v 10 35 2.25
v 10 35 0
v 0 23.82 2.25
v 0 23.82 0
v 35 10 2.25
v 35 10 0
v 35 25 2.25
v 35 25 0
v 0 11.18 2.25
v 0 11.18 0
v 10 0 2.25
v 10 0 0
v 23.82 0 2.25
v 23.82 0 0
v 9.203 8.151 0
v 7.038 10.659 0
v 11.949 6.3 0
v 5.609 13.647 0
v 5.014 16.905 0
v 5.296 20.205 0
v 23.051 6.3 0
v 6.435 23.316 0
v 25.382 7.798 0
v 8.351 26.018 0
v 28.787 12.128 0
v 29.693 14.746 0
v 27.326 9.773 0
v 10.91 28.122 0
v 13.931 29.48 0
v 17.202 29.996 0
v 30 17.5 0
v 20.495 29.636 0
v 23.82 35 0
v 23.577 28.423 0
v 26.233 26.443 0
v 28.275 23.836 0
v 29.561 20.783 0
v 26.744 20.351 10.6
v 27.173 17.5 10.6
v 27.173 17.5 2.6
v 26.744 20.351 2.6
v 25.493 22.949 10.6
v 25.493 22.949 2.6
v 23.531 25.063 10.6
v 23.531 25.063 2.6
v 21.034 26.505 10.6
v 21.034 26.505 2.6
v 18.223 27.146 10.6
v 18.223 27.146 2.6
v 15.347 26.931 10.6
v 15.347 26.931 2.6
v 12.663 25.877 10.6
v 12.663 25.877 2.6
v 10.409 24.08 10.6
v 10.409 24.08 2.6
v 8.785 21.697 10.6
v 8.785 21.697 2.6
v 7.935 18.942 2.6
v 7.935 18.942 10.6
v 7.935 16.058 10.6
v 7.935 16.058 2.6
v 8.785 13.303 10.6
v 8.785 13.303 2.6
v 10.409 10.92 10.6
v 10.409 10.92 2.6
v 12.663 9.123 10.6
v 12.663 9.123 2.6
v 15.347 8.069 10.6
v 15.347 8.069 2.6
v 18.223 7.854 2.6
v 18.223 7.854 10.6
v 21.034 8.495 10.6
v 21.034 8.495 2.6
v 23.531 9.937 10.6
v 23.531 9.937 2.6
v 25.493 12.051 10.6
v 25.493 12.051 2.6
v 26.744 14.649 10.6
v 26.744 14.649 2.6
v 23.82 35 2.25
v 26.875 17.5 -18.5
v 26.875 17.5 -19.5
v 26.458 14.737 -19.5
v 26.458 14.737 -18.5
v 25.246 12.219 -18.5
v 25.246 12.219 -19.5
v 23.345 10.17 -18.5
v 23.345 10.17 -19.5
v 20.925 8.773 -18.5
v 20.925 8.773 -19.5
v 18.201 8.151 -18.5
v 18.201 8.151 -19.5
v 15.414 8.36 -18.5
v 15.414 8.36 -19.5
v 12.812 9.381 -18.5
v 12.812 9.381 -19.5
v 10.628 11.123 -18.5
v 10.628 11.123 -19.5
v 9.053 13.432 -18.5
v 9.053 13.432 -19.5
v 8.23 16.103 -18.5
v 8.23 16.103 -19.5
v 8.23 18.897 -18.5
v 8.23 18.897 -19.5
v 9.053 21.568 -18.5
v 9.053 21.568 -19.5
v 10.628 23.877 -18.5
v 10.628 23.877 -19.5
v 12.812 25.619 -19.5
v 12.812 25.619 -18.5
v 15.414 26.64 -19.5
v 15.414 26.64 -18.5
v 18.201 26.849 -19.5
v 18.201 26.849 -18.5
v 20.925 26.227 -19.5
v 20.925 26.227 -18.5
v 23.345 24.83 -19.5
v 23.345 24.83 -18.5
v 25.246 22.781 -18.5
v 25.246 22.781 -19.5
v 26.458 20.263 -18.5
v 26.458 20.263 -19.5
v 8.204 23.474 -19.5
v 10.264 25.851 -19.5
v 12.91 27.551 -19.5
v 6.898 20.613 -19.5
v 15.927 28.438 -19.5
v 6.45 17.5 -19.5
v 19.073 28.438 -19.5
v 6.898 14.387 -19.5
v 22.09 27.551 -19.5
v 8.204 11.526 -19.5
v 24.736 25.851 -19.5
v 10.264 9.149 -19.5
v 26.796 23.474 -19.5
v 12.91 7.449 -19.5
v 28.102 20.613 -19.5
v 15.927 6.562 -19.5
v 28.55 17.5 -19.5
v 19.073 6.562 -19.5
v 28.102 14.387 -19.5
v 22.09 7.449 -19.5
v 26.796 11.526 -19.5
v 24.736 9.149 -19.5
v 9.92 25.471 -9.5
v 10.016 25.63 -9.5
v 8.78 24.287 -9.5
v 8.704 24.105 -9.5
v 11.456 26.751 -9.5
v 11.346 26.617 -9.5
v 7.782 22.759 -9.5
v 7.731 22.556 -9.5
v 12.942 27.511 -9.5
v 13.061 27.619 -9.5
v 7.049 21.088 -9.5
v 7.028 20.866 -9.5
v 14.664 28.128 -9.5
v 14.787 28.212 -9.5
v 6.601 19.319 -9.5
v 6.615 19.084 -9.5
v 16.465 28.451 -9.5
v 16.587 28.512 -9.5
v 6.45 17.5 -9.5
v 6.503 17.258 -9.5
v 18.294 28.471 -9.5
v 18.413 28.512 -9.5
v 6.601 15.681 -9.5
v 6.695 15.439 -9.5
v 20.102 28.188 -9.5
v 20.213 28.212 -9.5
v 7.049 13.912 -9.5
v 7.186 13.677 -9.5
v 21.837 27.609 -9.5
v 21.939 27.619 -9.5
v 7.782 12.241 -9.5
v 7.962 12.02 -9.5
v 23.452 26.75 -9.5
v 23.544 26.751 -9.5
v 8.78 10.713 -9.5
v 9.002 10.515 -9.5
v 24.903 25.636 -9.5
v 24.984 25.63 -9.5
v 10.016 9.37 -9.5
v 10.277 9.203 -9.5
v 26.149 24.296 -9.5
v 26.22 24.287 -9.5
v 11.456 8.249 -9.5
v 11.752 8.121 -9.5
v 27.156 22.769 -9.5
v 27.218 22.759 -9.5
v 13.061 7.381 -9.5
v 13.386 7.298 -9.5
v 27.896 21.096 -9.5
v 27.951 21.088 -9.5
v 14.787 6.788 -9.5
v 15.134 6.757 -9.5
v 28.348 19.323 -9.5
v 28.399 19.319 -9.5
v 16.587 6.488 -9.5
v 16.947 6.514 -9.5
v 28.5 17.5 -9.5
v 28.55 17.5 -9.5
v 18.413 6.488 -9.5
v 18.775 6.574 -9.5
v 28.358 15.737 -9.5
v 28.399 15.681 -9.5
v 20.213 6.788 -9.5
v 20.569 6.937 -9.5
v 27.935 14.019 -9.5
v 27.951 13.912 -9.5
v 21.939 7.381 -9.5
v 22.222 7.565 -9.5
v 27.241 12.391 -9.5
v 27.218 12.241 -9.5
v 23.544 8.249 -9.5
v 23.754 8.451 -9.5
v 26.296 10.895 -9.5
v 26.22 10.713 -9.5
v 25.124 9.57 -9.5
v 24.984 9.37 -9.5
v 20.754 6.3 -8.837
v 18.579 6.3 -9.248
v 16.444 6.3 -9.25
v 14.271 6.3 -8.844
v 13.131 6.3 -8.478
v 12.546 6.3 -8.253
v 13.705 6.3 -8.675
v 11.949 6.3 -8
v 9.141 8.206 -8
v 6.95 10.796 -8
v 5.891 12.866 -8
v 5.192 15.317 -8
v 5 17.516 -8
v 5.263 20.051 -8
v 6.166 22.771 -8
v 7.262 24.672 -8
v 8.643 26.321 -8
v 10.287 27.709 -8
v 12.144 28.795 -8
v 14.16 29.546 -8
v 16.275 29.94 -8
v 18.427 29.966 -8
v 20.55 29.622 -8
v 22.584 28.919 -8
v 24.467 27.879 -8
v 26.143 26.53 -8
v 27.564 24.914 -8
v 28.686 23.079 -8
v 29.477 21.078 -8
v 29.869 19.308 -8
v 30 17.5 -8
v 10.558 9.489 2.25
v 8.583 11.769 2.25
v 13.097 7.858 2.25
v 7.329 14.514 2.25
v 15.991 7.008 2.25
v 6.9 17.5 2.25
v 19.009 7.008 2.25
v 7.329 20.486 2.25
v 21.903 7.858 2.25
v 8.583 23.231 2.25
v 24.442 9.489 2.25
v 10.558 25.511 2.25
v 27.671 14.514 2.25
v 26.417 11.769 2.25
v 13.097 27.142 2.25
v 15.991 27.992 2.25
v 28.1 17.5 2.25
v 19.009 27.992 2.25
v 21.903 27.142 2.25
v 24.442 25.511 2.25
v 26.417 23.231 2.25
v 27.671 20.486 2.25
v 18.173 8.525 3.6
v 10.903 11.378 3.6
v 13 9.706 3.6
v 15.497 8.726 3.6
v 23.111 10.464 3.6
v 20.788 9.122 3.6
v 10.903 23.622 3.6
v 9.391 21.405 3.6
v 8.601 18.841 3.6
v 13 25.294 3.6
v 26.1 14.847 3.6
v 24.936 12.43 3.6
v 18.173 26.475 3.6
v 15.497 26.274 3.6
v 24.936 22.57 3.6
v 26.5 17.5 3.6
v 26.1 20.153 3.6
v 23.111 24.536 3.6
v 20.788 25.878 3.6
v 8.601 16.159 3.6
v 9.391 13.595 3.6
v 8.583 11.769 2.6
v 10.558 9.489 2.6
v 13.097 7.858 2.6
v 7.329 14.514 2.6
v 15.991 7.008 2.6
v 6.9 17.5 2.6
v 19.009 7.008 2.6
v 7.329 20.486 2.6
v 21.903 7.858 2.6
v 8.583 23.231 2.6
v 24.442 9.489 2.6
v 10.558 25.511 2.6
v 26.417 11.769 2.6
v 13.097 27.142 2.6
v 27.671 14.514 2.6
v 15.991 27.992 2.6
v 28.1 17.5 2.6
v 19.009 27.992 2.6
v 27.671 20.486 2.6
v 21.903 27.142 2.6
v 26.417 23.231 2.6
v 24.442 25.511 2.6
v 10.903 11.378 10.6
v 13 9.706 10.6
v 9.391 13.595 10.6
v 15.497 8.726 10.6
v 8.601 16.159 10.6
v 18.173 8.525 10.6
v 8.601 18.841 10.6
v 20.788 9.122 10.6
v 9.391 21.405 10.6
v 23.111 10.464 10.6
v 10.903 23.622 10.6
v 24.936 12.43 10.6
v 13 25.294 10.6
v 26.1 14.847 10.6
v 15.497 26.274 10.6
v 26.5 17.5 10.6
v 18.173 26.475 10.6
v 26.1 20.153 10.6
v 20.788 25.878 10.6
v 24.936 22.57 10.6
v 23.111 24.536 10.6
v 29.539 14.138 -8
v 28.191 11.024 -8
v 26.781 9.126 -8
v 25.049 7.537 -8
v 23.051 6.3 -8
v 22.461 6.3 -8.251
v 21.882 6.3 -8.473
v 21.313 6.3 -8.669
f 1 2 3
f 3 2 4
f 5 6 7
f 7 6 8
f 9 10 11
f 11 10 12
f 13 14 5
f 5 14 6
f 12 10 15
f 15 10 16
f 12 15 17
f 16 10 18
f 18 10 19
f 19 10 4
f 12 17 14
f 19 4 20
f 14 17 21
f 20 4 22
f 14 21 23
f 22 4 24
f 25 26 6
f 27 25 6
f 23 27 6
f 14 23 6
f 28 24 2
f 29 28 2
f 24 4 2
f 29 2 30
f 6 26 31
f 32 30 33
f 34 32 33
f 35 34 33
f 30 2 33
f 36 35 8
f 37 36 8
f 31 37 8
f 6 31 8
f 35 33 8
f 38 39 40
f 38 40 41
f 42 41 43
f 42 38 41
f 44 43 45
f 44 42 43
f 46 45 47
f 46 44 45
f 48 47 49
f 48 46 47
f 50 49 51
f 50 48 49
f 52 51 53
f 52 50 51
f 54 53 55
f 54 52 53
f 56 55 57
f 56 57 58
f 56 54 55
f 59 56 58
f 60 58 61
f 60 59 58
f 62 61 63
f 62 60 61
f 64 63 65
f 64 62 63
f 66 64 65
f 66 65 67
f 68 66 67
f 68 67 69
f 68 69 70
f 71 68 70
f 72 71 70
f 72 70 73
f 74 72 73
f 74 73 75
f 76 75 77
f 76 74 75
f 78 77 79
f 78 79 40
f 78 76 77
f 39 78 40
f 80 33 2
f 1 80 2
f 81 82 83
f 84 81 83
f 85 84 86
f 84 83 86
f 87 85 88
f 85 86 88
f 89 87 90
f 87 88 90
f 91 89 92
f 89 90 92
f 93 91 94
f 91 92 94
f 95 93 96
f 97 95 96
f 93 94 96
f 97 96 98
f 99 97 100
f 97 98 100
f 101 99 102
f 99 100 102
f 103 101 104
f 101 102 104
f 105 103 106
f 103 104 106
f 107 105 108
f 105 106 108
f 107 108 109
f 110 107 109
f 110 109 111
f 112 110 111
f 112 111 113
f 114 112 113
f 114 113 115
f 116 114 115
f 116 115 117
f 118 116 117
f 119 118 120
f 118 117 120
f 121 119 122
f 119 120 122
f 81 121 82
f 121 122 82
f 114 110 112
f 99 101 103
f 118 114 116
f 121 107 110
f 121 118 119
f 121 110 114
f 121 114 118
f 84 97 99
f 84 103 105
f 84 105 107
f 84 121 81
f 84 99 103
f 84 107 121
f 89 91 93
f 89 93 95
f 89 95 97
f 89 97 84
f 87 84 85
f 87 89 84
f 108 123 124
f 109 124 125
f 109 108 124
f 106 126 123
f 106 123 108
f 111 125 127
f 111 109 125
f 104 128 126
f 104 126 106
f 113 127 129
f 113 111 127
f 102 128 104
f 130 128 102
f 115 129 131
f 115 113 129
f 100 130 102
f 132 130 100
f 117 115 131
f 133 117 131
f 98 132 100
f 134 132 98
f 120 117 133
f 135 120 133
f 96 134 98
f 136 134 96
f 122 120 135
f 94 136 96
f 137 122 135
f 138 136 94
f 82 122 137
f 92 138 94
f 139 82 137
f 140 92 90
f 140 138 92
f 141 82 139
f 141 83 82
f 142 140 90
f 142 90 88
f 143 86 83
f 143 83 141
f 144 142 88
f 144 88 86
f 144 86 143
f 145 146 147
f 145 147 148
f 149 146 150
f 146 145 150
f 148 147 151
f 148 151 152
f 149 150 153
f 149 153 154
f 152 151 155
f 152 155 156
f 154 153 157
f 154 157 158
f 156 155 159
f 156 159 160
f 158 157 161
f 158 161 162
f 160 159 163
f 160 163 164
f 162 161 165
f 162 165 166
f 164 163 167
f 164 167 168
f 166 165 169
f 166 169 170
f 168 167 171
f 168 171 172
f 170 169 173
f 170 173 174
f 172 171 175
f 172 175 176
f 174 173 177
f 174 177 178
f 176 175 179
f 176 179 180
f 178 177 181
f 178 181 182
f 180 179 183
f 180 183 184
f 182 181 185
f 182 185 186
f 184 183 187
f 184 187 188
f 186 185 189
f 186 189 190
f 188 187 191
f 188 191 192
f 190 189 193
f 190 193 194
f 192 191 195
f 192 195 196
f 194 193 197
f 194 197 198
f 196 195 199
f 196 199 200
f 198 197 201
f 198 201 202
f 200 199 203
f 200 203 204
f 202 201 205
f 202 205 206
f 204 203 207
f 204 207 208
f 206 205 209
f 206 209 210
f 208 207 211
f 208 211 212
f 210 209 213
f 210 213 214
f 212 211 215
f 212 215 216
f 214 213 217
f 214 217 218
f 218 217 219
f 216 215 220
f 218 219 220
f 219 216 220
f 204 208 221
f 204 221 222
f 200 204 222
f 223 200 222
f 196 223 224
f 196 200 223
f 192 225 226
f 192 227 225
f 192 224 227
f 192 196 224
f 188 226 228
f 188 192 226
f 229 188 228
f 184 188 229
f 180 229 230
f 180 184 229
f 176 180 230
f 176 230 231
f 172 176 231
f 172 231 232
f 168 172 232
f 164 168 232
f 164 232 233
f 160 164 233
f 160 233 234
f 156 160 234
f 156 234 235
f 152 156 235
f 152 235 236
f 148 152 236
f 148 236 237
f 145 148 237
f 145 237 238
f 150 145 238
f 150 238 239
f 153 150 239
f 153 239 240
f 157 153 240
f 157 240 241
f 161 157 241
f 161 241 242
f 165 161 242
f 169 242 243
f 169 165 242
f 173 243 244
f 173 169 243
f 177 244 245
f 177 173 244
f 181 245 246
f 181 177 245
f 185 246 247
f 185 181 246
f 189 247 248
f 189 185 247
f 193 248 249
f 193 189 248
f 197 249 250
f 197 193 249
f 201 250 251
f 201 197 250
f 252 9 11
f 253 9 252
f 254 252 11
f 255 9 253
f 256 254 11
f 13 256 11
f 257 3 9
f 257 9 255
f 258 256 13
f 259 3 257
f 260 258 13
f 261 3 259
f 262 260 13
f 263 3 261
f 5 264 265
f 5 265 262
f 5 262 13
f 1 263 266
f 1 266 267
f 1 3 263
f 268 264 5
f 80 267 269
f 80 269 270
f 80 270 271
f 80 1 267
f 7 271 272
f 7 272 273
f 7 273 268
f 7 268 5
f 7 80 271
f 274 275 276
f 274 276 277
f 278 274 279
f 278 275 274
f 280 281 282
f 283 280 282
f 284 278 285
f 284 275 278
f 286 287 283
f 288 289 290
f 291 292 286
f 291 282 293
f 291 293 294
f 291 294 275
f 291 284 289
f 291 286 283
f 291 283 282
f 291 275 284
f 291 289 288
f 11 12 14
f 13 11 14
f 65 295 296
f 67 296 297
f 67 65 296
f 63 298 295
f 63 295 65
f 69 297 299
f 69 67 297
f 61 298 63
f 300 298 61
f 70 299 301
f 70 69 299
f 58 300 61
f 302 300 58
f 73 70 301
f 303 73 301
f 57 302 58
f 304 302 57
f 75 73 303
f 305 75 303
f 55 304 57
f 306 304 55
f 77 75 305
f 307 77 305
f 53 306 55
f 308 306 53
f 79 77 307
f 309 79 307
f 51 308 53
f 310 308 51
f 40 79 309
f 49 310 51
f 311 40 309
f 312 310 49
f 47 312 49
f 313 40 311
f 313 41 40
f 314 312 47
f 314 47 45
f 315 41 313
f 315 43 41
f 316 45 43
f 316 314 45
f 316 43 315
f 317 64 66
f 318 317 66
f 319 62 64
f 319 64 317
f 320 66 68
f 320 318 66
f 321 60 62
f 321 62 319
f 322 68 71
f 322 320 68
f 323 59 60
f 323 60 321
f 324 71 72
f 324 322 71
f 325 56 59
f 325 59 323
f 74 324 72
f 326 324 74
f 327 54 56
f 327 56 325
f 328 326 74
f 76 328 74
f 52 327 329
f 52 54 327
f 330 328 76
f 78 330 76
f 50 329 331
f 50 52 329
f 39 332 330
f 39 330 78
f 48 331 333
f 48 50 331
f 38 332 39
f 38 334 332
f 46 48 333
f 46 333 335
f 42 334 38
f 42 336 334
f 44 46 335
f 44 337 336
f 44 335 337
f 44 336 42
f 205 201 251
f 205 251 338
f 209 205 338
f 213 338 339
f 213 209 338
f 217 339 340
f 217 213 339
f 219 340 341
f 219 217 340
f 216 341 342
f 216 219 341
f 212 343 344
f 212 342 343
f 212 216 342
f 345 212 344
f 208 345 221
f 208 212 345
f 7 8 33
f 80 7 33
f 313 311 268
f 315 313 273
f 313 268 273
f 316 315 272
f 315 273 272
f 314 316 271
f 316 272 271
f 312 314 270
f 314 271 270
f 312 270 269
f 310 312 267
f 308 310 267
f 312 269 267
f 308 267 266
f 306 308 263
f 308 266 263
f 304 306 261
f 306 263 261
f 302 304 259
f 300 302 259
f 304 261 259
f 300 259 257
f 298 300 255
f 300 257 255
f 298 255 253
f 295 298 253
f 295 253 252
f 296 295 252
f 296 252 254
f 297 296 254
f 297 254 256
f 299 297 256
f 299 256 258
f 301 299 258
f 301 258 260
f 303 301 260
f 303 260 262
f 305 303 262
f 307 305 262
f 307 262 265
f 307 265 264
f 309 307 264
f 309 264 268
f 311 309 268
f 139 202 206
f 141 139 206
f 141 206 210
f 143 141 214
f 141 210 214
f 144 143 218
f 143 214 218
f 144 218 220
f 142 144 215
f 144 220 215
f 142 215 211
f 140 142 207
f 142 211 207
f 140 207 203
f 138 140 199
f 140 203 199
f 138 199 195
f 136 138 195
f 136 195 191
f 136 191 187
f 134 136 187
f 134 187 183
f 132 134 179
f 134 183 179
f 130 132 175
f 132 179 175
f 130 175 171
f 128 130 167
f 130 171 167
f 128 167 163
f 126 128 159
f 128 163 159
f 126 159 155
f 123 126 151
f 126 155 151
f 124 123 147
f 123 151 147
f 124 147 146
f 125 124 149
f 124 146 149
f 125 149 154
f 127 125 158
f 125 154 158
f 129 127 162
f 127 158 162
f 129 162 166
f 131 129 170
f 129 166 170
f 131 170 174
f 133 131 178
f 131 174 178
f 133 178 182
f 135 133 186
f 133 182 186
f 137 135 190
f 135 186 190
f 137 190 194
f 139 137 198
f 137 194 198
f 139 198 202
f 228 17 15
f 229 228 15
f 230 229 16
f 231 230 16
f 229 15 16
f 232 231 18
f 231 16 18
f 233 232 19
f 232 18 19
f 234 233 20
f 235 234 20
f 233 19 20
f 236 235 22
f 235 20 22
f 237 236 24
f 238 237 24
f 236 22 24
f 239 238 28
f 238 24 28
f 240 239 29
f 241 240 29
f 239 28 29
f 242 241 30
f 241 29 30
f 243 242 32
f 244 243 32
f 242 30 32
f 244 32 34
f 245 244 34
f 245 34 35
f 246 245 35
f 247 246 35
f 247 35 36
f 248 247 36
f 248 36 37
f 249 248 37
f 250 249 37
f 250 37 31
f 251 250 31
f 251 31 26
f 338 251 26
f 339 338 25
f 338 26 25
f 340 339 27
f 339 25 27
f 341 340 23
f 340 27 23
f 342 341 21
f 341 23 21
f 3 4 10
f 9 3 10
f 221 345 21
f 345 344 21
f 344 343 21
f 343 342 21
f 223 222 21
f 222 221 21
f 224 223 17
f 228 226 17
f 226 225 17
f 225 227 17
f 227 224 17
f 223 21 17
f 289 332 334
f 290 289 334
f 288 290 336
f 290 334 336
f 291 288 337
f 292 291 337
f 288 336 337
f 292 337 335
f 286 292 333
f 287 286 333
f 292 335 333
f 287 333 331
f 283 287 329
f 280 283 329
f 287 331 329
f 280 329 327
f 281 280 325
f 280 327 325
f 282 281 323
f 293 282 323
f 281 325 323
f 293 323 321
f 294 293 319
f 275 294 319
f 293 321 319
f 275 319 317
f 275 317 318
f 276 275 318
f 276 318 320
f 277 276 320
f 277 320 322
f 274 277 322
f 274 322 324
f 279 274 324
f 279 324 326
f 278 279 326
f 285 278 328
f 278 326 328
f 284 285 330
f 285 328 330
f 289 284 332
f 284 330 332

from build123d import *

# Parameters (mm, degrees)
F1_DEPTH    = 2.25
F2_R        = 10.6
F3_DEPTH    = 10.6
F5_DEPTH    = 9.5
F6_T2_ANGLE = 286.1981288485
F6_T4_ANGLE = 106.0815039342
F7_R        = 11.05
F8_DEPTH    = 10
F9_R        = 9
F10_DEPTH   = 7
F11_R       = 10.6
F11_R_2     = 9.6734059383
F12_DEPTH   = 8
F13_R       = 9.375
F14_DEPTH   = 1


# Not quite as in the source:
# - a fillet or chamfer that OpenCascade refuses, or shapes differently, is made with other operations: its cross-section is extruded or revolved along the edge and cut away or added


with BuildPart() as f1:
    # F0 (on Top) → F1 (new body)
    with BuildSketch(Plane.XY):
        Polygon((0, 11.1803398875), (10, 0), (23.8196601125, 0), (35, 10), (35, 25), (23.8196601125, 35), (10, 35), (0, 23.8196601125), align=None)
    extrude(amount=F1_DEPTH)

    # F2 (on Top) → F3 (join)
    with BuildSketch(Plane.XY):
        with Locations((17.5, 17.5)):
            Circle(F2_R)
    extrude(amount=F3_DEPTH)

    # F4 (on face) → F5 (join)
    with BuildSketch(Plane(origin=(0, 0, 0), x_dir=(1, 0, 0), z_dir=(0, 0, -1))):
        with BuildLine():
            ThreePointArc((11.9493243654, -6.3), (10.909607198, -28.1215216761), (30, -17.5))
            ThreePointArc((30, -17.5), (28.1215216761, -10.909607198), (23.0506756346, -6.3))
            Line((23.0506756346, -6.3), (11.9493243654, -6.3))
        make_face()
    extrude(amount=F5_DEPTH)

    # F6: chamfer of 1.5 on 2 edges, made by hand

    # F6_s1 → F6_t2 (revolve, cut)
    with BuildSketch(Plane(origin=(20.8261774668, 6.0498263405, 0), x_dir=(0, 0, 1), z_dir=(0.9603027964, 0.2789597449, 0))):
        with BuildLine():
            Line((-7.9575735931, 0.618923005), (-9.5424264069, -0.9659298087))
            Line((-9.5424264069, -0.9659298087), (-9.5724264069, -0.9659298087))
            ThreePointArc((-9.5724264069, -0.9659298087), (-9.53, -0.1947166053), (-9.53, 0.5764965982))
            Line((-9.53, 0.5764965982), (-9.5, 0.6064965982))
            ThreePointArc((-9.5, 0.6064965982), (-8.7287867966, 0.6064965982), (-7.9575735931, 0.648923005))
            Line((-7.9575735931, 0.648923005), (-7.9575735931, 0.618923005))
        make_face()
    revolve(axis=Axis((17.5, 17.5, -9.5), (0, 0, -1)), revolution_arc=F6_T2_ANGLE, mode=Mode.SUBTRACT)

    # F6_s3 → F6_t4 (revolve, cut)
    with BuildSketch(Plane.XZ.offset(-17.5)):
        with BuildLine():
            Line((30.0424264069, -7.9575735931), (28.4575735931, -9.5424264069))
            Line((28.4575735931, -9.5424264069), (28.4575735931, -9.5724264069))
            ThreePointArc((28.4575735931, -9.5724264069), (29.2287867966, -9.53), (30, -9.53))
            Line((30, -9.53), (30.03, -9.5))
            ThreePointArc((30.03, -9.5), (30.03, -8.7287867966), (30.0724264069, -7.9575735931))
            Line((30.0724264069, -7.9575735931), (30.0424264069, -7.9575735931))
        make_face()
    revolve(axis=Axis((17.5, 17.5, -9.5), (0, 0, -1)), revolution_arc=F6_T4_ANGLE, mode=Mode.SUBTRACT)

    # F7 (on face) → F8 (join)
    with BuildSketch(Plane(origin=(0, 0, -9.5), x_dir=(1, 0, 0), z_dir=(0, 0, -1))):
        with Locations((17.5, -17.5)):
            Circle(F7_R)
    extrude(amount=F8_DEPTH)

    # F9 (on face) → F10 (cut)
    with BuildSketch(Plane.XY.offset(10.6)):
        with Locations((17.5, 17.5)):
            Circle(F9_R)
    extrude(amount=-F10_DEPTH, mode=Mode.SUBTRACT)

    # F11 (on face) → F12 (cut)
    with BuildSketch(Plane.XY.offset(10.6)):
        with Locations((17.5, 17.5)):
            Circle(F11_R)
        with Locations((17.5, 17.5)):
            Circle(F11_R_2, mode=Mode.SUBTRACT)
    extrude(amount=-F12_DEPTH, mode=Mode.SUBTRACT)

    # F13 (on face) → F14 (cut)
    with BuildSketch(Plane(origin=(0, 0, -19.5), x_dir=(1, 0, 0), z_dir=(0, 0, -1))):
        with Locations((17.5, -17.5)):
            Circle(F13_R)
    extrude(amount=-F14_DEPTH, mode=Mode.SUBTRACT)


solid = f1.part
